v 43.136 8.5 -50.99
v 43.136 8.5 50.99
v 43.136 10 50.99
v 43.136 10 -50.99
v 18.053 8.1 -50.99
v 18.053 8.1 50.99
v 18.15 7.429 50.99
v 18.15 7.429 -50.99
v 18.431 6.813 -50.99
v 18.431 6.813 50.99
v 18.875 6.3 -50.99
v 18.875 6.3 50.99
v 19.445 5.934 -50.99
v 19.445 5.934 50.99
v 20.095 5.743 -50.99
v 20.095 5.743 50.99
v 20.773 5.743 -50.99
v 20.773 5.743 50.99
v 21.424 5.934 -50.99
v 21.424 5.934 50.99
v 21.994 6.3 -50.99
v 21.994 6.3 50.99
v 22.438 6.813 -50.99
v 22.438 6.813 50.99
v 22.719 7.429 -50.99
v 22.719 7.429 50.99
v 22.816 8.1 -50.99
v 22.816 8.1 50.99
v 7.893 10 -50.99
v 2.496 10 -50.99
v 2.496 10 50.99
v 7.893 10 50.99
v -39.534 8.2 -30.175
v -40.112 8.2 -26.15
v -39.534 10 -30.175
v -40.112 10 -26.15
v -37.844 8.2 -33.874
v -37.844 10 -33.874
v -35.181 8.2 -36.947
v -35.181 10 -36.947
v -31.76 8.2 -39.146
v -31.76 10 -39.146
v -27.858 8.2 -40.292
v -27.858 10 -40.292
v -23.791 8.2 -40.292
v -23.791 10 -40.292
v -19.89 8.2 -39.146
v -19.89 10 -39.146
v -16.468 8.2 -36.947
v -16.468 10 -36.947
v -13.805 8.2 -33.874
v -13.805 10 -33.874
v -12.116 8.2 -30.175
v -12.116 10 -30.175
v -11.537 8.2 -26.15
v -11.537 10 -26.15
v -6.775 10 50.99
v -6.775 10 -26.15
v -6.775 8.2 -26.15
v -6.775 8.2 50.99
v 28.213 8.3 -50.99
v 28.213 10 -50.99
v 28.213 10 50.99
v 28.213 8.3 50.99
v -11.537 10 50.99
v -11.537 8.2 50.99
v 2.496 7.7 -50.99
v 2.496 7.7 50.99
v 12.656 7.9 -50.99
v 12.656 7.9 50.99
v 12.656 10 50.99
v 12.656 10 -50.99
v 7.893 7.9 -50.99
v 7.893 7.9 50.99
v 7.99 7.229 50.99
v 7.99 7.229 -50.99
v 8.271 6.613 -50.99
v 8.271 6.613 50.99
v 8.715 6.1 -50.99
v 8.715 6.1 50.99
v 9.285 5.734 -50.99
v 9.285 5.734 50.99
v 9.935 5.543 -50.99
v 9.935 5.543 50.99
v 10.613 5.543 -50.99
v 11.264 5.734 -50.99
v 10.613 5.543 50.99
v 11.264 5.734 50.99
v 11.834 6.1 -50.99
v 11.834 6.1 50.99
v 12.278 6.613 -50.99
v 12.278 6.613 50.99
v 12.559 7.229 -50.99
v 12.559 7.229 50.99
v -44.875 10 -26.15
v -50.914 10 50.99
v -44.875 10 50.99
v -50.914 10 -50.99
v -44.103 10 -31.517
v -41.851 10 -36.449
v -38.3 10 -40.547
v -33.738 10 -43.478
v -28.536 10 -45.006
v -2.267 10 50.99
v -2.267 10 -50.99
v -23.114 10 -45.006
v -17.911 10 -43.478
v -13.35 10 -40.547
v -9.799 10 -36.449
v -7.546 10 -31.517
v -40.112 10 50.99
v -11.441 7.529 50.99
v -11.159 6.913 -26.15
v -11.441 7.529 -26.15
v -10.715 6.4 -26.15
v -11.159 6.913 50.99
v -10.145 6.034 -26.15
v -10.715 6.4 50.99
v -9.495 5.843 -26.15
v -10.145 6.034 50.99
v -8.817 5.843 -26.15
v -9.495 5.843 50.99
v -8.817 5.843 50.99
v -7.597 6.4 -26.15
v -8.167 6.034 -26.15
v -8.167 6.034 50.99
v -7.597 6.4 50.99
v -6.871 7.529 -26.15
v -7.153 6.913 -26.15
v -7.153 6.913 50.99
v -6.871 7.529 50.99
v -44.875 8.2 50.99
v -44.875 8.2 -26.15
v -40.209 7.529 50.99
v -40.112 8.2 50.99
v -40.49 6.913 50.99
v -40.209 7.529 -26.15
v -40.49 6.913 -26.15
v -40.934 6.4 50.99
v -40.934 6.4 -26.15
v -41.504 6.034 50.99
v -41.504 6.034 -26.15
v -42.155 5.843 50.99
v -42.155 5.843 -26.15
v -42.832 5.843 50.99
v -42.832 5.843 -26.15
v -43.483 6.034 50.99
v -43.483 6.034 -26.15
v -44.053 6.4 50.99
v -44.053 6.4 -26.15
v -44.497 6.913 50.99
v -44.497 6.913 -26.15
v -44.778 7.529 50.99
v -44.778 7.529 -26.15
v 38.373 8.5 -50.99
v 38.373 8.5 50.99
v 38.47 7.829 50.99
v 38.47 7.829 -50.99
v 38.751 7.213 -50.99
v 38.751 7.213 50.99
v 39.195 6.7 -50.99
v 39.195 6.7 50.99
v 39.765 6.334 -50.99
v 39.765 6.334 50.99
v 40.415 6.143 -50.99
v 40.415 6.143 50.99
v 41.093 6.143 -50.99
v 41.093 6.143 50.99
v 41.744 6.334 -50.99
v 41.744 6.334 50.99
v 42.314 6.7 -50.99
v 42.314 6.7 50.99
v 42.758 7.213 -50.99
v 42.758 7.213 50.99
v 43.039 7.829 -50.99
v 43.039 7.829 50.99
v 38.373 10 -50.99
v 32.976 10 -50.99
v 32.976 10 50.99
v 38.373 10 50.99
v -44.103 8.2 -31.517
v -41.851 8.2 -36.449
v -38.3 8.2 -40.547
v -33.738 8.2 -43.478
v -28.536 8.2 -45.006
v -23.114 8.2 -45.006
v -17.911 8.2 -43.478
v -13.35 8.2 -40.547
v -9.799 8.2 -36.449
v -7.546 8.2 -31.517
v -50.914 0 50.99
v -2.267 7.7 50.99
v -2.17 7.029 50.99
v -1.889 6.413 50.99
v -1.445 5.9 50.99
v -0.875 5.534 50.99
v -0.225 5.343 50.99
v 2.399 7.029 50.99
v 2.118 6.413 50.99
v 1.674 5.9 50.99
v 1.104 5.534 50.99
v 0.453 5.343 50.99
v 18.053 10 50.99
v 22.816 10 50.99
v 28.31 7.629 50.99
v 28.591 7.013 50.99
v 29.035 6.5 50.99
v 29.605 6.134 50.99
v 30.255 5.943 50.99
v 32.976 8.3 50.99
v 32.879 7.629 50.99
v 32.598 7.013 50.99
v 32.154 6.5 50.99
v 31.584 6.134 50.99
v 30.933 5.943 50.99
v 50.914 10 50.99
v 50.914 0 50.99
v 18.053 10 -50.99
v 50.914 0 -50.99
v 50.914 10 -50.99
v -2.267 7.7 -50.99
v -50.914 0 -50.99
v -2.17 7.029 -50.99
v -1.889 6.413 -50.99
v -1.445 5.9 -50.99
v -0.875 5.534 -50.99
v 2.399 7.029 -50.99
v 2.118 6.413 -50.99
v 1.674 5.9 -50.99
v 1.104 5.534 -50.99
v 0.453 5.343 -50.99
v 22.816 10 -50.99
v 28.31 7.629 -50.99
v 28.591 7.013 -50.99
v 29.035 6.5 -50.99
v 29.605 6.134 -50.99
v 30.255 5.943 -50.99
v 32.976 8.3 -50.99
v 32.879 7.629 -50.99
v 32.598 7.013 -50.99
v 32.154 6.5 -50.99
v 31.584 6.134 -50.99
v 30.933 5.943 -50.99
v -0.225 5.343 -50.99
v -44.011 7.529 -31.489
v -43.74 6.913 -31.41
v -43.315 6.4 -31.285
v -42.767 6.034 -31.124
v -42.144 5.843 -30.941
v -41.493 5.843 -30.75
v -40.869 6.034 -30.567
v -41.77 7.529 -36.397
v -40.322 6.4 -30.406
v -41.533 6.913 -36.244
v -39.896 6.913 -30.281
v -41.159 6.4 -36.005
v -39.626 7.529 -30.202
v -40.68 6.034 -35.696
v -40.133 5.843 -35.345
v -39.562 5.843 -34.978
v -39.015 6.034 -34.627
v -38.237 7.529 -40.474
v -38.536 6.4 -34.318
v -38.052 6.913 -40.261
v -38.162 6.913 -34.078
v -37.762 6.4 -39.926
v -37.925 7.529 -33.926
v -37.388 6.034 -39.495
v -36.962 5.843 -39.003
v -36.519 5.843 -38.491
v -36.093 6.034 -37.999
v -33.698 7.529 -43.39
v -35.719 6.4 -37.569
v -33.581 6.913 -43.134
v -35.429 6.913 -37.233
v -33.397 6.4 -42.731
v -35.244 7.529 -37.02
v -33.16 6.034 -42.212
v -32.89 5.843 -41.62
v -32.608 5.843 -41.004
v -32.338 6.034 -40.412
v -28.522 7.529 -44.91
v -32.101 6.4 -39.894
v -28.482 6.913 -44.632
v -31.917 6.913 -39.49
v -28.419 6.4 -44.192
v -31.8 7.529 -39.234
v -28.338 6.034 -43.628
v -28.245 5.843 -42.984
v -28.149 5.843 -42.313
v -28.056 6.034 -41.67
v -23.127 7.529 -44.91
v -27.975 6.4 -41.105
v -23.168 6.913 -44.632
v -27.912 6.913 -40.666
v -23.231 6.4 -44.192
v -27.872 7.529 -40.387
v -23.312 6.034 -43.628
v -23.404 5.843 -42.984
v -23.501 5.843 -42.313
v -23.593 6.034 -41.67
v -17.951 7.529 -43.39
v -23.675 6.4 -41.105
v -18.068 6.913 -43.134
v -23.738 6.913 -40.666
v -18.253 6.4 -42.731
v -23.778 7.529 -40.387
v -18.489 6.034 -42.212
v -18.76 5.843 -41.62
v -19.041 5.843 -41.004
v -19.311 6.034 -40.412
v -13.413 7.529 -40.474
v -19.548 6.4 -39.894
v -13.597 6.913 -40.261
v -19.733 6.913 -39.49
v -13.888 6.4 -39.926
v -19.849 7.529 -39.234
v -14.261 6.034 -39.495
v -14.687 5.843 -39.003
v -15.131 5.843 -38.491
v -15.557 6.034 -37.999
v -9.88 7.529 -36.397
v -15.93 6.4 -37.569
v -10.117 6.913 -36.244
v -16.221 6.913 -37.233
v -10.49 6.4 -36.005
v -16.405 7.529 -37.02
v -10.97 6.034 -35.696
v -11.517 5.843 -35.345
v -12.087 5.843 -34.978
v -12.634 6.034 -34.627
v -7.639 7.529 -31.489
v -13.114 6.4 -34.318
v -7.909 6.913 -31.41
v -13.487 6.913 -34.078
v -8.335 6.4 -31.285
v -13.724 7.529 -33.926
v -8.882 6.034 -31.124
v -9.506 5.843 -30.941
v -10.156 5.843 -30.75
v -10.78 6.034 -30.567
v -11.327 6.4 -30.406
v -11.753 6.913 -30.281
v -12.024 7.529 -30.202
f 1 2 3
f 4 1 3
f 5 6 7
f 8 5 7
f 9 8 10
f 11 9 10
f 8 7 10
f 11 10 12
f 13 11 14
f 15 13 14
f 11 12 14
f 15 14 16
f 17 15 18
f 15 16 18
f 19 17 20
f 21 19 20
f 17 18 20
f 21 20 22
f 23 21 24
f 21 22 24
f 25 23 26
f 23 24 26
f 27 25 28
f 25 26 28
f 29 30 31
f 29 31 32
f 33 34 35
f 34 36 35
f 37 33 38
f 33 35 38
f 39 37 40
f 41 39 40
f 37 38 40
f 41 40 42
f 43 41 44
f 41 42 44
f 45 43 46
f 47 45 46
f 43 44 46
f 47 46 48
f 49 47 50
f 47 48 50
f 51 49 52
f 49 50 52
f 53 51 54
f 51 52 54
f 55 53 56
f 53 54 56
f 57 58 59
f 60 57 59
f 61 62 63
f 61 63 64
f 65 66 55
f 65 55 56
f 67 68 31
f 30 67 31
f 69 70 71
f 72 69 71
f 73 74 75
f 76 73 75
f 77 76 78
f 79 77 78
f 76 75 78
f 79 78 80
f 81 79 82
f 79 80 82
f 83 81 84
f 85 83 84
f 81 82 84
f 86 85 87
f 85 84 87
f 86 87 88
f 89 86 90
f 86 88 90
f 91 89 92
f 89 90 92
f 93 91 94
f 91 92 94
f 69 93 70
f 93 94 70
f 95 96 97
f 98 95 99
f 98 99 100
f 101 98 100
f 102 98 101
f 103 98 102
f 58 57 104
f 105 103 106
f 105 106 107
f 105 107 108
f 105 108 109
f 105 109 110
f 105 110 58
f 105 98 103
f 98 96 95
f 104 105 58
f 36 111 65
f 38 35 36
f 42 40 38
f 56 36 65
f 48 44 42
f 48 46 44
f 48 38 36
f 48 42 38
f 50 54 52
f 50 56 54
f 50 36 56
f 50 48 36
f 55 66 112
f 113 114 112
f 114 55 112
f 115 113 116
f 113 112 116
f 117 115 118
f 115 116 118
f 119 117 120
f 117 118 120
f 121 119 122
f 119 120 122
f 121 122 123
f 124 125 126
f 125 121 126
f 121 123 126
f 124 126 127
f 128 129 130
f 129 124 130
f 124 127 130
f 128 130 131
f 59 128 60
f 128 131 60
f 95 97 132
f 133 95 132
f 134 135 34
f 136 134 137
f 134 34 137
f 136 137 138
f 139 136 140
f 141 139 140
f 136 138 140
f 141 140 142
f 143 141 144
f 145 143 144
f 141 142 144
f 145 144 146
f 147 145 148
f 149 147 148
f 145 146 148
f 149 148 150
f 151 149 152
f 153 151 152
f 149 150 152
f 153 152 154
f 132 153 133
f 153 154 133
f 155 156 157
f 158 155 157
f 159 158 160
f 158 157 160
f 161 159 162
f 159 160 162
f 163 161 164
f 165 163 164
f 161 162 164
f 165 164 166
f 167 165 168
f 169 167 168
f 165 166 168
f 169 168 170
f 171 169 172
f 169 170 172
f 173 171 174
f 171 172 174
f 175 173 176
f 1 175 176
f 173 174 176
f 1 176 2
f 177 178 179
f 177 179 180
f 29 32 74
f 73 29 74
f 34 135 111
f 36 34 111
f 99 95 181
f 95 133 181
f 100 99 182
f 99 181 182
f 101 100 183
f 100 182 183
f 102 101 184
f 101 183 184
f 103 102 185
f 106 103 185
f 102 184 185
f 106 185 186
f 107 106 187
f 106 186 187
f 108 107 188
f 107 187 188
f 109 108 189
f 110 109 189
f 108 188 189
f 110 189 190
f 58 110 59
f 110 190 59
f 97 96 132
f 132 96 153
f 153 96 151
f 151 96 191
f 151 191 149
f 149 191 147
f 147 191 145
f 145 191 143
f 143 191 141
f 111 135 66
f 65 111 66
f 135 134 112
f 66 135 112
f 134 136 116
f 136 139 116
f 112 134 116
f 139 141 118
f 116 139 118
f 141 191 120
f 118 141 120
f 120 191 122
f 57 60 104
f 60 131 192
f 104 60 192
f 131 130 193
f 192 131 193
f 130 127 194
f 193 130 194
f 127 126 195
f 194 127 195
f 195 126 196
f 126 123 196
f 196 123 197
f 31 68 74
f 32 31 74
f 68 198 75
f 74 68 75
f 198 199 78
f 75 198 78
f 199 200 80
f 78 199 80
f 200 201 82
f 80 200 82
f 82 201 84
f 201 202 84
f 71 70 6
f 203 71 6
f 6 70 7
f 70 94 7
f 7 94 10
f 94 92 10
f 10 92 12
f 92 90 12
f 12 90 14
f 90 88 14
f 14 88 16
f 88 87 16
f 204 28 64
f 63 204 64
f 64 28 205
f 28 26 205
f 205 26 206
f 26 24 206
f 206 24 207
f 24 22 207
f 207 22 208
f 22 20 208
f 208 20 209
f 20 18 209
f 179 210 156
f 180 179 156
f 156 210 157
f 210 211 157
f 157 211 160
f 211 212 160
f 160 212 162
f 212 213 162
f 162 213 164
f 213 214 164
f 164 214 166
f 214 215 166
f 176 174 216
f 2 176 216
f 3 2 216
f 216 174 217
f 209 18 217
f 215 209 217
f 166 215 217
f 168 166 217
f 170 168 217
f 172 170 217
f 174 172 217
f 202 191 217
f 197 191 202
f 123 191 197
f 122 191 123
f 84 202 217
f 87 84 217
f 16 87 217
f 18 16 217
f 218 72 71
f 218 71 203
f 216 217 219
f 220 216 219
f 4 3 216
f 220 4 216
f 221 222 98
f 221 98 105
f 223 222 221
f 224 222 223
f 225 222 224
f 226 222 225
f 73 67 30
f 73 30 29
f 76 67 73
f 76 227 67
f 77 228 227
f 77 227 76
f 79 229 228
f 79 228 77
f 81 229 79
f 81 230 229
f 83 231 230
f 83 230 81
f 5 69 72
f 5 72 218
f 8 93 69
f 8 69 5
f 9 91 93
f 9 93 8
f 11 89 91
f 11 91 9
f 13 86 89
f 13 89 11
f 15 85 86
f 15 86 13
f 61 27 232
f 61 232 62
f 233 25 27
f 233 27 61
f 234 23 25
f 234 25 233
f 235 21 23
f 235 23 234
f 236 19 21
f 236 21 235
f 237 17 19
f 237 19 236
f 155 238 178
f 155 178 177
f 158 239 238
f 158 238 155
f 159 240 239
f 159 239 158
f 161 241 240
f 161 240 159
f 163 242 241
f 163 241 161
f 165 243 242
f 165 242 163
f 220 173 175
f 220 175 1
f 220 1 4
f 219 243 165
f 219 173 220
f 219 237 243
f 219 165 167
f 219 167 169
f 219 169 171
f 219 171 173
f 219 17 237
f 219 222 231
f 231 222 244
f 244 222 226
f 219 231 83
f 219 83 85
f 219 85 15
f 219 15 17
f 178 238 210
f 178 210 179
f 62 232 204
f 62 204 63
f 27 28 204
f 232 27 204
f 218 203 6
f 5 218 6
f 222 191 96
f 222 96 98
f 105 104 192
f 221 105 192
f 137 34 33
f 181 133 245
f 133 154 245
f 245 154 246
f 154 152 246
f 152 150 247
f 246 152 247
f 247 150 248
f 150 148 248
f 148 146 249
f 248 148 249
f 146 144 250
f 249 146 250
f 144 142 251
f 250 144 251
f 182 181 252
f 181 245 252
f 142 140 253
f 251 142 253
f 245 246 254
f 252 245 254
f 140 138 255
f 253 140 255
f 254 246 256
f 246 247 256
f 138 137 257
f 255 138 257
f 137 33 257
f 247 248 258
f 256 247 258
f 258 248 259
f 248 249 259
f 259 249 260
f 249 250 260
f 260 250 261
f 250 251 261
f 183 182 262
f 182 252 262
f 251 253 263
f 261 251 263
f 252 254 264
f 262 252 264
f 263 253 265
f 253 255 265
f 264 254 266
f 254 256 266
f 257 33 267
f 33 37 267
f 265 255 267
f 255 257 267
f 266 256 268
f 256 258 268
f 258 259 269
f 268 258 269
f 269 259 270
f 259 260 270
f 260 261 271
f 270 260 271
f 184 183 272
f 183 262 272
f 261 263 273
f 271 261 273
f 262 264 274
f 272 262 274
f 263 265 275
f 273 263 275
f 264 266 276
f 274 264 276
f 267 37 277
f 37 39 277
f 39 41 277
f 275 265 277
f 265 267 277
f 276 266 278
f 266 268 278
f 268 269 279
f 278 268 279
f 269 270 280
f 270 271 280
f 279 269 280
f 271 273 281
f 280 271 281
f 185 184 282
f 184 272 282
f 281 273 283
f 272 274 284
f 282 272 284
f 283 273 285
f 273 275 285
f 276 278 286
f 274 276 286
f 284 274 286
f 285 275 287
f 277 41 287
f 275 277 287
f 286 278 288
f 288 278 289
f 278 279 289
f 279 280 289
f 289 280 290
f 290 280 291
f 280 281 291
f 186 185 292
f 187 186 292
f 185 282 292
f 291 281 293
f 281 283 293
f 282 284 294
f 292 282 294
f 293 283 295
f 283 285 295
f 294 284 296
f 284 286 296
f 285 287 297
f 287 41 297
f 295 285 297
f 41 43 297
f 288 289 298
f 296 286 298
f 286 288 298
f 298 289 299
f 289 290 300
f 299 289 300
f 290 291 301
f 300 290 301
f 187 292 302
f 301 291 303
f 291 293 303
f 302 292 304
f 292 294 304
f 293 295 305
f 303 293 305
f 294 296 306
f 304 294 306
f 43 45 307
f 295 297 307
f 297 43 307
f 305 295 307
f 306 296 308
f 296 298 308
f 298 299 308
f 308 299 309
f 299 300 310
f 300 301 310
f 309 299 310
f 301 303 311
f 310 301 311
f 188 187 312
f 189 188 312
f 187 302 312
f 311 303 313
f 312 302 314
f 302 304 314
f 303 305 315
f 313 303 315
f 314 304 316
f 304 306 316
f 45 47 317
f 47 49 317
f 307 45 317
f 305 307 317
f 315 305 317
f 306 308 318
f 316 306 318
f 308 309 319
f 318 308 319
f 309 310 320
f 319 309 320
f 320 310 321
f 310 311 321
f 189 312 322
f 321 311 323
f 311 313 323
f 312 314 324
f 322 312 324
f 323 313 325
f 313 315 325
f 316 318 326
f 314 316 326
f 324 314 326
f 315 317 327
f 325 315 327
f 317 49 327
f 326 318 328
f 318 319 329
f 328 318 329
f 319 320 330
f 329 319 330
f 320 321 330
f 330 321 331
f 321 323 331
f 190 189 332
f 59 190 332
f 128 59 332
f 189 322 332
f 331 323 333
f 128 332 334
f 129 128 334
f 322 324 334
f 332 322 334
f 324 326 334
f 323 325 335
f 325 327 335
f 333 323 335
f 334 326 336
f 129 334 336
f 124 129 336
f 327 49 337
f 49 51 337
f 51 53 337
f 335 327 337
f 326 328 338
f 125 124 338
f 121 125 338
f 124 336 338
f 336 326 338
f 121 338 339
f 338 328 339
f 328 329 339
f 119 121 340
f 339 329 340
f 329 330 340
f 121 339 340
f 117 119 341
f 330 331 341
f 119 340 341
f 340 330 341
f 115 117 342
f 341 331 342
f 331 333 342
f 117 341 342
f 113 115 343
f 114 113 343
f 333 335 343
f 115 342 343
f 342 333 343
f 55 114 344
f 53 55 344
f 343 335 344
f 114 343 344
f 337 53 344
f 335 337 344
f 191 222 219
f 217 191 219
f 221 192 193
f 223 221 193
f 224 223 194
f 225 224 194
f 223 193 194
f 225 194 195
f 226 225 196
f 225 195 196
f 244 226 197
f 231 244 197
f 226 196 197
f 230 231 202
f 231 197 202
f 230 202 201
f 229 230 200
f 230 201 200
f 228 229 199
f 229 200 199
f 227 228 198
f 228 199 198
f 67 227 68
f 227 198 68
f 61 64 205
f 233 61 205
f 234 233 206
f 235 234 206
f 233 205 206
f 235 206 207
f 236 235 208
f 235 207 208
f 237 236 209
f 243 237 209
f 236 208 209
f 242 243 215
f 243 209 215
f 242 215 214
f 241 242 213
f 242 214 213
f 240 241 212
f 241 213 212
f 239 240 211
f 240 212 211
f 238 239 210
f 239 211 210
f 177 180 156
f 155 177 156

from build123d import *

# Parameters (mm, degrees)
SKETCH1_W           = 101.8286
SKETCH1_H           = 101.981
BOSS_EXTRUDE1_DEPTH = 10


with BuildPart() as part:
    # Sketch1 → Boss-Extrude1 (new body)
    with BuildSketch(Plane(origin=(0, 0, 0), x_dir=(1, 0, 0), z_dir=(0, 1, 0))):
        Rectangle(SKETCH1_W, SKETCH1_H)
    extrude(amount=BOSS_EXTRUDE1_DEPTH)

    # Cut-Sweep1: sweep along a path in Sketch2
    with BuildLine(Plane(origin=(0, 10, 0), x_dir=(1, 0, 0), z_dir=(0, 1, 0))) as cut_sweep1_path:
        Line((-42.493557128, -50.9905), (-42.493557128, 26.149650848))
        ThreePointArc((-42.493557128, 26.149650848), (-25.824807128, 42.818400848), (-9.156057128, 26.149650848))
        Line((-9.156057128, 26.149650848), (-9.156057128, -50.9905))
    # Sketch3 → Cut-Sweep1 (sweep, cut)
    with BuildSketch(Plane.XY.offset(50.9905)):
        with BuildLine():
            Line((-40.112307128, 10), (-44.874807128, 10))
            Line((-44.874807128, 10), (-44.874807128, 8.2))
            ThreePointArc((-44.874807128, 8.2), (-42.493557128, 5.81875), (-40.112307128, 8.2))
            Line((-40.112307128, 8.2), (-40.112307128, 10))
        make_face()
    sweep(path=cut_sweep1_path.line, mode=Mode.SUBTRACT)

    # Cut-Sweep2: sweep along a path in Sketch4
    with BuildLine(Plane(origin=(0, 10, 0), x_dir=(1, 0, 0), z_dir=(0, 1, 0))) as cut_sweep2_path:
        Line((10.2743, 50.9905), (10.2743, -50.9905))
    # Sketch5 → Cut-Sweep2 (sweep, cut)
    with BuildSketch(Plane.XY.offset(50.9905)):
        with BuildLine():
            Line((7.89305, 10), (12.65555, 10))
            Line((12.65555, 10), (12.65555, 7.9))
            ThreePointArc((12.65555, 7.9), (10.2743, 5.51875), (7.89305, 7.9))
            Line((7.89305, 7.9), (7.89305, 10))
        make_face()
        with BuildLine():
            Line((18.05305, 10), (22.81555, 10))
            Line((22.81555, 10), (22.81555, 8.1))
            ThreePointArc((22.81555, 8.1), (20.4343, 5.71875), (18.05305, 8.1))
            Line((18.05305, 8.1), (18.05305, 10))
        make_face()
        with BuildLine():
            Line((28.21305, 10), (32.97555, 10))
            Line((32.97555, 10), (32.97555, 8.3))
            ThreePointArc((32.97555, 8.3), (30.5943, 5.91875), (28.21305, 8.3))
            Line((28.21305, 8.3), (28.21305, 10))
        make_face()
        with BuildLine():
            Line((38.37305, 10), (43.13555, 10))
            Line((43.13555, 10), (43.13555, 8.5))
            ThreePointArc((43.13555, 8.5), (40.7543, 6.11875), (38.37305, 8.5))
            Line((38.37305, 8.5), (38.37305, 10))
        make_face()
        with BuildLine():
            Line((-2.26695, 10), (2.49555, 10))
            Line((2.49555, 10), (2.49555, 7.7))
            ThreePointArc((2.49555, 7.7), (0.1143, 5.31875), (-2.26695, 7.7))
            Line((-2.26695, 7.7), (-2.26695, 10))
        make_face()
    sweep(path=cut_sweep2_path.line, mode=Mode.SUBTRACT)


solid = part.part
